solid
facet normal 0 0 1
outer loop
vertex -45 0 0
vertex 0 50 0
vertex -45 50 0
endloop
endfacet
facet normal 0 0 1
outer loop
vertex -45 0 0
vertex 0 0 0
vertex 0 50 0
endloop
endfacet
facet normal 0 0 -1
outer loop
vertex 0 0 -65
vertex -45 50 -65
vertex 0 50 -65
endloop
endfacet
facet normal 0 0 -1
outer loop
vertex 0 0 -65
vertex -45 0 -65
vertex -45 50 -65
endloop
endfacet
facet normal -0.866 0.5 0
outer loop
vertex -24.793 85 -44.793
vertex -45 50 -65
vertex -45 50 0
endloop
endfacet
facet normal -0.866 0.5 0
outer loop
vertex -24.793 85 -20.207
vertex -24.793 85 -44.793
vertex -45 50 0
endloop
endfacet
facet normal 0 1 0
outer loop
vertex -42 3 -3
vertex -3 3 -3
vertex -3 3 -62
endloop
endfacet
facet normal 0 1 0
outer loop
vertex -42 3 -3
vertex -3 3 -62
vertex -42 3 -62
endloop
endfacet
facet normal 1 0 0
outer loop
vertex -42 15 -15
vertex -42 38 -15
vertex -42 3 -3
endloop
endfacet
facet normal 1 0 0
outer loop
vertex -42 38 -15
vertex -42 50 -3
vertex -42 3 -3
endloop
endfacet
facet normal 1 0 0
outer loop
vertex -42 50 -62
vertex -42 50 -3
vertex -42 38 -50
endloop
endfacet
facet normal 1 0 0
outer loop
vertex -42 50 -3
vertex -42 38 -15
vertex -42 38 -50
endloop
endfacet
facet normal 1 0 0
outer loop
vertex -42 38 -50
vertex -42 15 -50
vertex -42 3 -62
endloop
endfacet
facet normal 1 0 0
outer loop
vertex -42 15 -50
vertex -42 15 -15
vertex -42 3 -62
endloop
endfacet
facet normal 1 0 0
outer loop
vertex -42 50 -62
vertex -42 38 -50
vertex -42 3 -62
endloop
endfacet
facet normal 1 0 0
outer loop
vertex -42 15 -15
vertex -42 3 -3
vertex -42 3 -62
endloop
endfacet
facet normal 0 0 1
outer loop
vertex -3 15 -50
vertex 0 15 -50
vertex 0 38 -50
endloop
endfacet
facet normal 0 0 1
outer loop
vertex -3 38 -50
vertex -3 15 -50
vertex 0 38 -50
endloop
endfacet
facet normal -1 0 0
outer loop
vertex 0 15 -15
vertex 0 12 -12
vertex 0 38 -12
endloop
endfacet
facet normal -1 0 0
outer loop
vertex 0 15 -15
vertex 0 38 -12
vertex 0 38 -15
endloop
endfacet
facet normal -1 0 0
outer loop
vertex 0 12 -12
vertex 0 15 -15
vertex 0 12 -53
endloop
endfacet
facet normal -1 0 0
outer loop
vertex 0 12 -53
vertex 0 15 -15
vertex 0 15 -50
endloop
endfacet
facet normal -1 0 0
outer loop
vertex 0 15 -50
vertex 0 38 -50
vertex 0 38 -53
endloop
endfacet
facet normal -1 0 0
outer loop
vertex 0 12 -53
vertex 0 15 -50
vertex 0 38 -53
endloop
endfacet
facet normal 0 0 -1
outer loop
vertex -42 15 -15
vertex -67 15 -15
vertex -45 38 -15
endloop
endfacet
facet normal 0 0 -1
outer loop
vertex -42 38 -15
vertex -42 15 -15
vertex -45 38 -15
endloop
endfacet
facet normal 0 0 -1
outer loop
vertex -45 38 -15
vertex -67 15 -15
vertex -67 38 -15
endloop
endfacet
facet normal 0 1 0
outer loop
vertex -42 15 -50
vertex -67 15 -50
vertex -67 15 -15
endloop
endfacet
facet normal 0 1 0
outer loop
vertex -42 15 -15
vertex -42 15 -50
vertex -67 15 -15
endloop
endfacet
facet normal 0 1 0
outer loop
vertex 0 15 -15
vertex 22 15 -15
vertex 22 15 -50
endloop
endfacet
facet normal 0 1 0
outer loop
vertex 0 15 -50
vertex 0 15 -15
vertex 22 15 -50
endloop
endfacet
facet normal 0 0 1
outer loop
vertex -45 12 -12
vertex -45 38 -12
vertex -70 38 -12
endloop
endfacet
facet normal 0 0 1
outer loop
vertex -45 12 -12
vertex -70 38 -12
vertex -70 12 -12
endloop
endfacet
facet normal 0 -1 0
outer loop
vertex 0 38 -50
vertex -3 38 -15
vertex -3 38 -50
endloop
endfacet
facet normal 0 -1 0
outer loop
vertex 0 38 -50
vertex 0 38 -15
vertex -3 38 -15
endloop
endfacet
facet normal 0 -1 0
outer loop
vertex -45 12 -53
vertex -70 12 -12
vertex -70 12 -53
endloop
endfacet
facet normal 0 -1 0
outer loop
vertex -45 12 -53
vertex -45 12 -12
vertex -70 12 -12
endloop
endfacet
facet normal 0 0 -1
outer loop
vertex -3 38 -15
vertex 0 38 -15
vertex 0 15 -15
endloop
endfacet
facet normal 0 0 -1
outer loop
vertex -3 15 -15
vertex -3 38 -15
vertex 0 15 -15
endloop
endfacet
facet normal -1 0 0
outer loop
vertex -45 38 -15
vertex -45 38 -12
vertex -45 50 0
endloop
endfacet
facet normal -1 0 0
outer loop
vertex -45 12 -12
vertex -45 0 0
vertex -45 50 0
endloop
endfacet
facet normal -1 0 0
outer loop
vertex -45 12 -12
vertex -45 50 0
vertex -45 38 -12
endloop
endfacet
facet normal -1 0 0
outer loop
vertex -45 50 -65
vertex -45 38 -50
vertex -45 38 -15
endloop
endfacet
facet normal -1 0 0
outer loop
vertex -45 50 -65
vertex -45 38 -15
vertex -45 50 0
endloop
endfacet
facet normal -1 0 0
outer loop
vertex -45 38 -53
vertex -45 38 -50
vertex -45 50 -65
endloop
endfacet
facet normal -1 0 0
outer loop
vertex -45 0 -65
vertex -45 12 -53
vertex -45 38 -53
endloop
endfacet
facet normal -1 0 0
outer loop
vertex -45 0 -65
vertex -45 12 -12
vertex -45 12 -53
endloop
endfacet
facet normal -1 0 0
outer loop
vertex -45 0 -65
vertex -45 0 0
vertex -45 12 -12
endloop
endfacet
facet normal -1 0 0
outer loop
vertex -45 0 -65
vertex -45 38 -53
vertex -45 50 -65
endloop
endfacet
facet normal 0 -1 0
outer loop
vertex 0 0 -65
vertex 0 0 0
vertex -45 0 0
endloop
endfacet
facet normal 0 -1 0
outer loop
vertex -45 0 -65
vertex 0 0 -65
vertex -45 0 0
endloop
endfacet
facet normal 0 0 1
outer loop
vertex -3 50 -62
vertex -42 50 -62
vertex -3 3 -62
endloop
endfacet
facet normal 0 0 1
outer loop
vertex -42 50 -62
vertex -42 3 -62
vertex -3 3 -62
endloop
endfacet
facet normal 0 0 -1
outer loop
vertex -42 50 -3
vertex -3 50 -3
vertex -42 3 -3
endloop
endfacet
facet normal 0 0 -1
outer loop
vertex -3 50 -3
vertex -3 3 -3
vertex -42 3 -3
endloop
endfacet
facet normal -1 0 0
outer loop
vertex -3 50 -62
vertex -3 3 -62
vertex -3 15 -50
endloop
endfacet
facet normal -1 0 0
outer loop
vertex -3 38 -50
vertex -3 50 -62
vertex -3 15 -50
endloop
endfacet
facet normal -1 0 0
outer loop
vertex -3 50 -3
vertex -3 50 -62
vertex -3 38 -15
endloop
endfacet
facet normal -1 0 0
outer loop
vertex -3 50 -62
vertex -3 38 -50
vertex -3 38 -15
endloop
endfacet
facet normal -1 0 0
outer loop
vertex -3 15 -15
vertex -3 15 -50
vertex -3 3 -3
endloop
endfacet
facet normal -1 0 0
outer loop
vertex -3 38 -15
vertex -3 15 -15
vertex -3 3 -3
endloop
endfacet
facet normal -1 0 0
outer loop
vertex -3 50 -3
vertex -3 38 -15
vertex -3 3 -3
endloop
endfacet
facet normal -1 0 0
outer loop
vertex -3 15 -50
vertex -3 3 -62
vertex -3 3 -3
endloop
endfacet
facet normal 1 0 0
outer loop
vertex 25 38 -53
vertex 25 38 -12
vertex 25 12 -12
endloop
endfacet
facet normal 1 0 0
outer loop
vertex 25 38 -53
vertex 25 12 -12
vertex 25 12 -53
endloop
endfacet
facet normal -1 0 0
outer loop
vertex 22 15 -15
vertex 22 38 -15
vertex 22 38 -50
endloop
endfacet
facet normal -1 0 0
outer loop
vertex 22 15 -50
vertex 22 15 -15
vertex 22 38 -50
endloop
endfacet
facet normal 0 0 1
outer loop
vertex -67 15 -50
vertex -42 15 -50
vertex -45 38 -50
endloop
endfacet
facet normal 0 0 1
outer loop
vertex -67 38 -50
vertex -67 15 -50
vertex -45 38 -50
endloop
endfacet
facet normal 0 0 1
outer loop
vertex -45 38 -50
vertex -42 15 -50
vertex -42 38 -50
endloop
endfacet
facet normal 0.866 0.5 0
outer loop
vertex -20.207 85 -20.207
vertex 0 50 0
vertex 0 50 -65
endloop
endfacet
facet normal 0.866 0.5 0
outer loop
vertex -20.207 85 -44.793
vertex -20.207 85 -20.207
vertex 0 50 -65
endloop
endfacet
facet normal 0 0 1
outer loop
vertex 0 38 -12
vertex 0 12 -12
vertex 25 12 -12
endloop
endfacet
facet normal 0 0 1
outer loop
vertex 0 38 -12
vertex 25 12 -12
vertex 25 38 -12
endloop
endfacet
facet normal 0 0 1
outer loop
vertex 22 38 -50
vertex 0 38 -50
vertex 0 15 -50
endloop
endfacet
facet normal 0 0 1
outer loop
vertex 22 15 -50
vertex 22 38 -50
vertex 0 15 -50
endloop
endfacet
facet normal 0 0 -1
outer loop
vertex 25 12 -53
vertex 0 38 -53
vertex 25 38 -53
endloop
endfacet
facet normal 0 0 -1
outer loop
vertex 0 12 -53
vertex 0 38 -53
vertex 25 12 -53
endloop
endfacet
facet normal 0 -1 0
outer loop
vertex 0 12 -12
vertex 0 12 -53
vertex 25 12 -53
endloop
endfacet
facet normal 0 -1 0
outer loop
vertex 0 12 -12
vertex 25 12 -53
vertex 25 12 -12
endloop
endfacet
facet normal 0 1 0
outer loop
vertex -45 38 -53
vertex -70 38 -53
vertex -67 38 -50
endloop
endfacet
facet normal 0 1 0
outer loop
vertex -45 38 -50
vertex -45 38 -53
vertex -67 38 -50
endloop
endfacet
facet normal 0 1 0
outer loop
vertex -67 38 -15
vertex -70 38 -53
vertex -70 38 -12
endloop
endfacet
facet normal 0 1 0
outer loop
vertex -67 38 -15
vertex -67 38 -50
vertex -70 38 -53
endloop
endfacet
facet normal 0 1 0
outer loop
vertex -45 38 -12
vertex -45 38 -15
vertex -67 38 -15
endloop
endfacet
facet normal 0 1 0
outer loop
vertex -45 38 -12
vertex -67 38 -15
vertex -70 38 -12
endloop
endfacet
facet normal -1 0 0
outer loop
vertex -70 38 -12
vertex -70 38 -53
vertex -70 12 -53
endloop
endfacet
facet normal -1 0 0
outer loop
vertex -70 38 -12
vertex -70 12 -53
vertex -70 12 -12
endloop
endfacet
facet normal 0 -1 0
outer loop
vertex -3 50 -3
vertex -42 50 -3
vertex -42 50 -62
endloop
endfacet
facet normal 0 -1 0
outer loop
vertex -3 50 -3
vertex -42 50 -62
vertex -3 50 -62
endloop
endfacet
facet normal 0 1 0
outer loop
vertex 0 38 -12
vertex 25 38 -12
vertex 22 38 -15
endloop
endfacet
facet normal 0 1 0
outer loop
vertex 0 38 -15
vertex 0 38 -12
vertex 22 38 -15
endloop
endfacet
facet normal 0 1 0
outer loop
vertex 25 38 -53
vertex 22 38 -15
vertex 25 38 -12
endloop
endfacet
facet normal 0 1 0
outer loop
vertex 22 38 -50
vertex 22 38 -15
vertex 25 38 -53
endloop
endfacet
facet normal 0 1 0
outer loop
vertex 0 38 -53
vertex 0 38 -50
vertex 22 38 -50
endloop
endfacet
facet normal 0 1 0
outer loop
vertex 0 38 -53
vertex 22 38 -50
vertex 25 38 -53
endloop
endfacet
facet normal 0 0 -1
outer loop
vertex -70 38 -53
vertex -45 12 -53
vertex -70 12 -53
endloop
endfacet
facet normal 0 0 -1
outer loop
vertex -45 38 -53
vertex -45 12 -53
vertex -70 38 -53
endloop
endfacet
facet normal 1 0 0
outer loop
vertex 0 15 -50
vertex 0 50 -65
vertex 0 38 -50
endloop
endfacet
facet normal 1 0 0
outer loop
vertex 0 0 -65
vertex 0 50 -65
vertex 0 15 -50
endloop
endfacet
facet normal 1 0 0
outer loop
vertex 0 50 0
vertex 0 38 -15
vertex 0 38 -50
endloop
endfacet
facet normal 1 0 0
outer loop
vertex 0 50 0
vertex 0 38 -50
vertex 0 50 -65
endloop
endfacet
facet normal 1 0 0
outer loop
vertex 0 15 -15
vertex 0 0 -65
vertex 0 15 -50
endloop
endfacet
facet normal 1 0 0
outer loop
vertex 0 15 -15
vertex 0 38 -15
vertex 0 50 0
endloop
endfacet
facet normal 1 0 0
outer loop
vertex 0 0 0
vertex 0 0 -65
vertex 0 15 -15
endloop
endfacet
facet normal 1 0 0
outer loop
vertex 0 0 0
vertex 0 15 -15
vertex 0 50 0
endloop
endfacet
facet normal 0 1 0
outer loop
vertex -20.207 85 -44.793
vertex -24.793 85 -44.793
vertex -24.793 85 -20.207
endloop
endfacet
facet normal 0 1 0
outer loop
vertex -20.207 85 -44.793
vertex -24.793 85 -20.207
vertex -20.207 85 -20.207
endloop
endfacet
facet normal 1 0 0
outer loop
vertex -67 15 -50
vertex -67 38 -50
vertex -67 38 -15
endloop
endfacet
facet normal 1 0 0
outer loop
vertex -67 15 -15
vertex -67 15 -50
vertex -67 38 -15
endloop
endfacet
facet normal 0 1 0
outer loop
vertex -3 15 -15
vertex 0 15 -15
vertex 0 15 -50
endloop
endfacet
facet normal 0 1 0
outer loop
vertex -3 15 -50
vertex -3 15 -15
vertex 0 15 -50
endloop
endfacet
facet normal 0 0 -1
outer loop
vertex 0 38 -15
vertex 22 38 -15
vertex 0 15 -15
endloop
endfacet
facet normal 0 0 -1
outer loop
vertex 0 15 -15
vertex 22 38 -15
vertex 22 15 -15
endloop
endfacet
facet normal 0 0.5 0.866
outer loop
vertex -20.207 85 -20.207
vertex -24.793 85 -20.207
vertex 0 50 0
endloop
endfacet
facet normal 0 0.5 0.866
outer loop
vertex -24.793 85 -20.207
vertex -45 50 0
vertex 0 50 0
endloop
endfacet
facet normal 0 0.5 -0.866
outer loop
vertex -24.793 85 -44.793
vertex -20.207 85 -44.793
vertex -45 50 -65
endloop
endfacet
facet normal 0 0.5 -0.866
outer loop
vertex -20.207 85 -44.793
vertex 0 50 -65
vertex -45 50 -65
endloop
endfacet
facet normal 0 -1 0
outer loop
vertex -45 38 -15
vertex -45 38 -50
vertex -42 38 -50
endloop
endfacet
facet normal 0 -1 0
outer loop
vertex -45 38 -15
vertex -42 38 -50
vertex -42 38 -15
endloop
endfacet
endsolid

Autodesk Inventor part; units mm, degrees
ref_plane "YZ Plane" through (0, 0, 0) normal (1, 0, 0) x (0, 1, 0)
ref_plane "XZ Plane" through (0, 0, 0) normal (0, 1, 0) x (-1, 0, 0)
sketch "草圖1" plane through (0, 0, 0) normal (0, 1, 0) x (-1, 0, 0)
  line L0 (0, 0) -> (45, 0)
  line L1 (45, 0) -> (45, -65)
  line L2 (45, -65) -> (0, -65)
  line L3 (0, -65) -> (0, 0)
  dimension "d0" = 45
  dimension "d1" = 65
extrude "擠出1" add sketch "草圖1" along normal blind 50
shell "薄殼1" thickness 3 removed faces 1 at (-15, 50, -21.666667)
sketch "草圖2" plane through (0, 0, 0) normal (1, 0, 0) x (0, 0, -1)
  line L0 (65, 50) -> (65, 0) projected
  line L1 (65, 0) -> (0, 0) projected
  line L2 (0, 0) -> (0, 50) projected
  line L3 (0, 50) -> (65, 50) projected
  line L4 (53, 38) -> (53, 12)
  line L5 (53, 12) -> (12, 12)
  line L6 (12, 12) -> (12, 38)
  line L7 (12, 38) -> (53, 38)
  dimension "d5" = 12
extrude "擠出2" add sketch "草圖2" along normal blind 25 separate body contours L4 L5 L6 L7
shell "薄殼2" thickness 3 removed faces 1 at (8.333333, 38, -39.333333) bodies 2
ref_plane "工作平面1" through (-22.5, 0, 0) normal (1, 0, 0) x (0, 0, -1)
sketch "草圖3" plane through (3, 15, -15) normal (1, 0, 0) x (0, 0, -1)
  line L0 (35, 0) -> (35, 23) projected
  line L1 (0, 23) -> (35, 23) projected
  line L2 (-3, 23) -> (0, 23) projected
  line L3 (-3, -3) -> (-3, 23) projected
  line L4 (38, -3) -> (-3, -3) projected
  line L5 (38, 23) -> (38, -3) projected
  line L6 (35, 23) -> (38, 23) projected
  line L7 (0, 0) -> (35, 0) projected
  line L8 (0, 23) -> (0, 0) projected
  point P0 (-15, -15)
extrude "擠出3" cut sketch "草圖3" against normal blind 25 contours L7 L8 L1 L0 bodies 2
sketch "草圖4" plane through (0, 0, 0) normal (1, 0, 0) x (0, 0, -1)
  line L0 (65, 50) -> (65, 0) projected
  line L1 (65, 0) -> (0, 0) projected
  line L2 (0, 0) -> (0, 50) projected
  line L3 (0, 50) -> (65, 50) projected
  line L4 (50, 38) -> (53, 38) projected
  line L5 (53, 38) -> (53, 12) projected
  line L6 (53, 12) -> (12, 12) projected
  line L7 (12, 12) -> (12, 38) projected
  line L8 (12, 38) -> (15, 38) projected
  line L9 (15, 38) -> (15, 15) projected
  line L10 (15, 15) -> (50, 15) projected
  line L11 (50, 15) -> (50, 38) projected
  line L12 (15, 38) -> (50, 38)
  line L13 (50, 38) -> (50, 15)
  line L14 (50, 15) -> (15, 15)
  line L15 (15, 15) -> (15, 38)
extrude "擠出4" cut sketch "草圖4" against normal blind 10 contours L11 L10 L9 L12 bodies 1
mirror "鏡射1" about plane through (-22.5, 0, 0) normal (1, 0, 0) of "擠出4", "擠出2", "擠出3" bodies 1
shell "薄殼3" thickness 3 removed faces 1 at (-62.666667, 38, -26.666667) bodies 1
sketch "草圖5" plane through (-51, 15, -15) normal (-1, 0, 0) x (0, 0, 1)
  line L0 (0, 0) -> (0, 23) projected
  line L1 (-35, 23) -> (0, 23) projected
  line L2 (-38, 23) -> (-35, 23) projected
  line L3 (-38, -3) -> (-38, 23) projected
  line L4 (3, -3) -> (-38, -3) projected
  line L5 (3, 23) -> (3, -3) projected
  line L6 (0, 23) -> (3, 23) projected
  line L7 (-35, 0) -> (0, 0) projected
  line L8 (-35, 23) -> (-35, 0) projected
  point P0 (15, -15)
extrude "擠出5" cut sketch "草圖5" against normal blind 10 contours L7 L8 L1 L0 bodies 1
sketch "草圖6" plane through (0, 50, 0) normal (0, 1, 0) x (1, 0, 0)
  line L0 (-3, 3) -> (-3, 62) projected
  line L1 (-3, 62) -> (-42, 62) projected
  line L2 (-42, 62) -> (-42, 3) projected
  line L3 (-42, 3) -> (-3, 3) projected
  line L4 (0, 65) -> (0, 0) projected
  line L5 (0, 0) -> (-45, 0) projected
  line L6 (-45, 0) -> (-45, 65) projected
  line L7 (-45, 65) -> (0, 65) projected
sketch "草圖6 outline for 擠出6" plane through (0, 50, 0) normal (0, 1, 0) x (1, 0, 0)
  line L0 (0, 65) -> (-45, 65)
  line L1 (0, 0) -> (0, 65)
  line L2 (-45, 0) -> (0, 0)
  line L3 (-45, 65) -> (-45, 0)
extrude "擠出6" add sketch "草圖6 outline for 擠出6" along normal blind 35 draft -30 bodies 1
properties part number "110033226_ipt_55_內城堡屋頂"
